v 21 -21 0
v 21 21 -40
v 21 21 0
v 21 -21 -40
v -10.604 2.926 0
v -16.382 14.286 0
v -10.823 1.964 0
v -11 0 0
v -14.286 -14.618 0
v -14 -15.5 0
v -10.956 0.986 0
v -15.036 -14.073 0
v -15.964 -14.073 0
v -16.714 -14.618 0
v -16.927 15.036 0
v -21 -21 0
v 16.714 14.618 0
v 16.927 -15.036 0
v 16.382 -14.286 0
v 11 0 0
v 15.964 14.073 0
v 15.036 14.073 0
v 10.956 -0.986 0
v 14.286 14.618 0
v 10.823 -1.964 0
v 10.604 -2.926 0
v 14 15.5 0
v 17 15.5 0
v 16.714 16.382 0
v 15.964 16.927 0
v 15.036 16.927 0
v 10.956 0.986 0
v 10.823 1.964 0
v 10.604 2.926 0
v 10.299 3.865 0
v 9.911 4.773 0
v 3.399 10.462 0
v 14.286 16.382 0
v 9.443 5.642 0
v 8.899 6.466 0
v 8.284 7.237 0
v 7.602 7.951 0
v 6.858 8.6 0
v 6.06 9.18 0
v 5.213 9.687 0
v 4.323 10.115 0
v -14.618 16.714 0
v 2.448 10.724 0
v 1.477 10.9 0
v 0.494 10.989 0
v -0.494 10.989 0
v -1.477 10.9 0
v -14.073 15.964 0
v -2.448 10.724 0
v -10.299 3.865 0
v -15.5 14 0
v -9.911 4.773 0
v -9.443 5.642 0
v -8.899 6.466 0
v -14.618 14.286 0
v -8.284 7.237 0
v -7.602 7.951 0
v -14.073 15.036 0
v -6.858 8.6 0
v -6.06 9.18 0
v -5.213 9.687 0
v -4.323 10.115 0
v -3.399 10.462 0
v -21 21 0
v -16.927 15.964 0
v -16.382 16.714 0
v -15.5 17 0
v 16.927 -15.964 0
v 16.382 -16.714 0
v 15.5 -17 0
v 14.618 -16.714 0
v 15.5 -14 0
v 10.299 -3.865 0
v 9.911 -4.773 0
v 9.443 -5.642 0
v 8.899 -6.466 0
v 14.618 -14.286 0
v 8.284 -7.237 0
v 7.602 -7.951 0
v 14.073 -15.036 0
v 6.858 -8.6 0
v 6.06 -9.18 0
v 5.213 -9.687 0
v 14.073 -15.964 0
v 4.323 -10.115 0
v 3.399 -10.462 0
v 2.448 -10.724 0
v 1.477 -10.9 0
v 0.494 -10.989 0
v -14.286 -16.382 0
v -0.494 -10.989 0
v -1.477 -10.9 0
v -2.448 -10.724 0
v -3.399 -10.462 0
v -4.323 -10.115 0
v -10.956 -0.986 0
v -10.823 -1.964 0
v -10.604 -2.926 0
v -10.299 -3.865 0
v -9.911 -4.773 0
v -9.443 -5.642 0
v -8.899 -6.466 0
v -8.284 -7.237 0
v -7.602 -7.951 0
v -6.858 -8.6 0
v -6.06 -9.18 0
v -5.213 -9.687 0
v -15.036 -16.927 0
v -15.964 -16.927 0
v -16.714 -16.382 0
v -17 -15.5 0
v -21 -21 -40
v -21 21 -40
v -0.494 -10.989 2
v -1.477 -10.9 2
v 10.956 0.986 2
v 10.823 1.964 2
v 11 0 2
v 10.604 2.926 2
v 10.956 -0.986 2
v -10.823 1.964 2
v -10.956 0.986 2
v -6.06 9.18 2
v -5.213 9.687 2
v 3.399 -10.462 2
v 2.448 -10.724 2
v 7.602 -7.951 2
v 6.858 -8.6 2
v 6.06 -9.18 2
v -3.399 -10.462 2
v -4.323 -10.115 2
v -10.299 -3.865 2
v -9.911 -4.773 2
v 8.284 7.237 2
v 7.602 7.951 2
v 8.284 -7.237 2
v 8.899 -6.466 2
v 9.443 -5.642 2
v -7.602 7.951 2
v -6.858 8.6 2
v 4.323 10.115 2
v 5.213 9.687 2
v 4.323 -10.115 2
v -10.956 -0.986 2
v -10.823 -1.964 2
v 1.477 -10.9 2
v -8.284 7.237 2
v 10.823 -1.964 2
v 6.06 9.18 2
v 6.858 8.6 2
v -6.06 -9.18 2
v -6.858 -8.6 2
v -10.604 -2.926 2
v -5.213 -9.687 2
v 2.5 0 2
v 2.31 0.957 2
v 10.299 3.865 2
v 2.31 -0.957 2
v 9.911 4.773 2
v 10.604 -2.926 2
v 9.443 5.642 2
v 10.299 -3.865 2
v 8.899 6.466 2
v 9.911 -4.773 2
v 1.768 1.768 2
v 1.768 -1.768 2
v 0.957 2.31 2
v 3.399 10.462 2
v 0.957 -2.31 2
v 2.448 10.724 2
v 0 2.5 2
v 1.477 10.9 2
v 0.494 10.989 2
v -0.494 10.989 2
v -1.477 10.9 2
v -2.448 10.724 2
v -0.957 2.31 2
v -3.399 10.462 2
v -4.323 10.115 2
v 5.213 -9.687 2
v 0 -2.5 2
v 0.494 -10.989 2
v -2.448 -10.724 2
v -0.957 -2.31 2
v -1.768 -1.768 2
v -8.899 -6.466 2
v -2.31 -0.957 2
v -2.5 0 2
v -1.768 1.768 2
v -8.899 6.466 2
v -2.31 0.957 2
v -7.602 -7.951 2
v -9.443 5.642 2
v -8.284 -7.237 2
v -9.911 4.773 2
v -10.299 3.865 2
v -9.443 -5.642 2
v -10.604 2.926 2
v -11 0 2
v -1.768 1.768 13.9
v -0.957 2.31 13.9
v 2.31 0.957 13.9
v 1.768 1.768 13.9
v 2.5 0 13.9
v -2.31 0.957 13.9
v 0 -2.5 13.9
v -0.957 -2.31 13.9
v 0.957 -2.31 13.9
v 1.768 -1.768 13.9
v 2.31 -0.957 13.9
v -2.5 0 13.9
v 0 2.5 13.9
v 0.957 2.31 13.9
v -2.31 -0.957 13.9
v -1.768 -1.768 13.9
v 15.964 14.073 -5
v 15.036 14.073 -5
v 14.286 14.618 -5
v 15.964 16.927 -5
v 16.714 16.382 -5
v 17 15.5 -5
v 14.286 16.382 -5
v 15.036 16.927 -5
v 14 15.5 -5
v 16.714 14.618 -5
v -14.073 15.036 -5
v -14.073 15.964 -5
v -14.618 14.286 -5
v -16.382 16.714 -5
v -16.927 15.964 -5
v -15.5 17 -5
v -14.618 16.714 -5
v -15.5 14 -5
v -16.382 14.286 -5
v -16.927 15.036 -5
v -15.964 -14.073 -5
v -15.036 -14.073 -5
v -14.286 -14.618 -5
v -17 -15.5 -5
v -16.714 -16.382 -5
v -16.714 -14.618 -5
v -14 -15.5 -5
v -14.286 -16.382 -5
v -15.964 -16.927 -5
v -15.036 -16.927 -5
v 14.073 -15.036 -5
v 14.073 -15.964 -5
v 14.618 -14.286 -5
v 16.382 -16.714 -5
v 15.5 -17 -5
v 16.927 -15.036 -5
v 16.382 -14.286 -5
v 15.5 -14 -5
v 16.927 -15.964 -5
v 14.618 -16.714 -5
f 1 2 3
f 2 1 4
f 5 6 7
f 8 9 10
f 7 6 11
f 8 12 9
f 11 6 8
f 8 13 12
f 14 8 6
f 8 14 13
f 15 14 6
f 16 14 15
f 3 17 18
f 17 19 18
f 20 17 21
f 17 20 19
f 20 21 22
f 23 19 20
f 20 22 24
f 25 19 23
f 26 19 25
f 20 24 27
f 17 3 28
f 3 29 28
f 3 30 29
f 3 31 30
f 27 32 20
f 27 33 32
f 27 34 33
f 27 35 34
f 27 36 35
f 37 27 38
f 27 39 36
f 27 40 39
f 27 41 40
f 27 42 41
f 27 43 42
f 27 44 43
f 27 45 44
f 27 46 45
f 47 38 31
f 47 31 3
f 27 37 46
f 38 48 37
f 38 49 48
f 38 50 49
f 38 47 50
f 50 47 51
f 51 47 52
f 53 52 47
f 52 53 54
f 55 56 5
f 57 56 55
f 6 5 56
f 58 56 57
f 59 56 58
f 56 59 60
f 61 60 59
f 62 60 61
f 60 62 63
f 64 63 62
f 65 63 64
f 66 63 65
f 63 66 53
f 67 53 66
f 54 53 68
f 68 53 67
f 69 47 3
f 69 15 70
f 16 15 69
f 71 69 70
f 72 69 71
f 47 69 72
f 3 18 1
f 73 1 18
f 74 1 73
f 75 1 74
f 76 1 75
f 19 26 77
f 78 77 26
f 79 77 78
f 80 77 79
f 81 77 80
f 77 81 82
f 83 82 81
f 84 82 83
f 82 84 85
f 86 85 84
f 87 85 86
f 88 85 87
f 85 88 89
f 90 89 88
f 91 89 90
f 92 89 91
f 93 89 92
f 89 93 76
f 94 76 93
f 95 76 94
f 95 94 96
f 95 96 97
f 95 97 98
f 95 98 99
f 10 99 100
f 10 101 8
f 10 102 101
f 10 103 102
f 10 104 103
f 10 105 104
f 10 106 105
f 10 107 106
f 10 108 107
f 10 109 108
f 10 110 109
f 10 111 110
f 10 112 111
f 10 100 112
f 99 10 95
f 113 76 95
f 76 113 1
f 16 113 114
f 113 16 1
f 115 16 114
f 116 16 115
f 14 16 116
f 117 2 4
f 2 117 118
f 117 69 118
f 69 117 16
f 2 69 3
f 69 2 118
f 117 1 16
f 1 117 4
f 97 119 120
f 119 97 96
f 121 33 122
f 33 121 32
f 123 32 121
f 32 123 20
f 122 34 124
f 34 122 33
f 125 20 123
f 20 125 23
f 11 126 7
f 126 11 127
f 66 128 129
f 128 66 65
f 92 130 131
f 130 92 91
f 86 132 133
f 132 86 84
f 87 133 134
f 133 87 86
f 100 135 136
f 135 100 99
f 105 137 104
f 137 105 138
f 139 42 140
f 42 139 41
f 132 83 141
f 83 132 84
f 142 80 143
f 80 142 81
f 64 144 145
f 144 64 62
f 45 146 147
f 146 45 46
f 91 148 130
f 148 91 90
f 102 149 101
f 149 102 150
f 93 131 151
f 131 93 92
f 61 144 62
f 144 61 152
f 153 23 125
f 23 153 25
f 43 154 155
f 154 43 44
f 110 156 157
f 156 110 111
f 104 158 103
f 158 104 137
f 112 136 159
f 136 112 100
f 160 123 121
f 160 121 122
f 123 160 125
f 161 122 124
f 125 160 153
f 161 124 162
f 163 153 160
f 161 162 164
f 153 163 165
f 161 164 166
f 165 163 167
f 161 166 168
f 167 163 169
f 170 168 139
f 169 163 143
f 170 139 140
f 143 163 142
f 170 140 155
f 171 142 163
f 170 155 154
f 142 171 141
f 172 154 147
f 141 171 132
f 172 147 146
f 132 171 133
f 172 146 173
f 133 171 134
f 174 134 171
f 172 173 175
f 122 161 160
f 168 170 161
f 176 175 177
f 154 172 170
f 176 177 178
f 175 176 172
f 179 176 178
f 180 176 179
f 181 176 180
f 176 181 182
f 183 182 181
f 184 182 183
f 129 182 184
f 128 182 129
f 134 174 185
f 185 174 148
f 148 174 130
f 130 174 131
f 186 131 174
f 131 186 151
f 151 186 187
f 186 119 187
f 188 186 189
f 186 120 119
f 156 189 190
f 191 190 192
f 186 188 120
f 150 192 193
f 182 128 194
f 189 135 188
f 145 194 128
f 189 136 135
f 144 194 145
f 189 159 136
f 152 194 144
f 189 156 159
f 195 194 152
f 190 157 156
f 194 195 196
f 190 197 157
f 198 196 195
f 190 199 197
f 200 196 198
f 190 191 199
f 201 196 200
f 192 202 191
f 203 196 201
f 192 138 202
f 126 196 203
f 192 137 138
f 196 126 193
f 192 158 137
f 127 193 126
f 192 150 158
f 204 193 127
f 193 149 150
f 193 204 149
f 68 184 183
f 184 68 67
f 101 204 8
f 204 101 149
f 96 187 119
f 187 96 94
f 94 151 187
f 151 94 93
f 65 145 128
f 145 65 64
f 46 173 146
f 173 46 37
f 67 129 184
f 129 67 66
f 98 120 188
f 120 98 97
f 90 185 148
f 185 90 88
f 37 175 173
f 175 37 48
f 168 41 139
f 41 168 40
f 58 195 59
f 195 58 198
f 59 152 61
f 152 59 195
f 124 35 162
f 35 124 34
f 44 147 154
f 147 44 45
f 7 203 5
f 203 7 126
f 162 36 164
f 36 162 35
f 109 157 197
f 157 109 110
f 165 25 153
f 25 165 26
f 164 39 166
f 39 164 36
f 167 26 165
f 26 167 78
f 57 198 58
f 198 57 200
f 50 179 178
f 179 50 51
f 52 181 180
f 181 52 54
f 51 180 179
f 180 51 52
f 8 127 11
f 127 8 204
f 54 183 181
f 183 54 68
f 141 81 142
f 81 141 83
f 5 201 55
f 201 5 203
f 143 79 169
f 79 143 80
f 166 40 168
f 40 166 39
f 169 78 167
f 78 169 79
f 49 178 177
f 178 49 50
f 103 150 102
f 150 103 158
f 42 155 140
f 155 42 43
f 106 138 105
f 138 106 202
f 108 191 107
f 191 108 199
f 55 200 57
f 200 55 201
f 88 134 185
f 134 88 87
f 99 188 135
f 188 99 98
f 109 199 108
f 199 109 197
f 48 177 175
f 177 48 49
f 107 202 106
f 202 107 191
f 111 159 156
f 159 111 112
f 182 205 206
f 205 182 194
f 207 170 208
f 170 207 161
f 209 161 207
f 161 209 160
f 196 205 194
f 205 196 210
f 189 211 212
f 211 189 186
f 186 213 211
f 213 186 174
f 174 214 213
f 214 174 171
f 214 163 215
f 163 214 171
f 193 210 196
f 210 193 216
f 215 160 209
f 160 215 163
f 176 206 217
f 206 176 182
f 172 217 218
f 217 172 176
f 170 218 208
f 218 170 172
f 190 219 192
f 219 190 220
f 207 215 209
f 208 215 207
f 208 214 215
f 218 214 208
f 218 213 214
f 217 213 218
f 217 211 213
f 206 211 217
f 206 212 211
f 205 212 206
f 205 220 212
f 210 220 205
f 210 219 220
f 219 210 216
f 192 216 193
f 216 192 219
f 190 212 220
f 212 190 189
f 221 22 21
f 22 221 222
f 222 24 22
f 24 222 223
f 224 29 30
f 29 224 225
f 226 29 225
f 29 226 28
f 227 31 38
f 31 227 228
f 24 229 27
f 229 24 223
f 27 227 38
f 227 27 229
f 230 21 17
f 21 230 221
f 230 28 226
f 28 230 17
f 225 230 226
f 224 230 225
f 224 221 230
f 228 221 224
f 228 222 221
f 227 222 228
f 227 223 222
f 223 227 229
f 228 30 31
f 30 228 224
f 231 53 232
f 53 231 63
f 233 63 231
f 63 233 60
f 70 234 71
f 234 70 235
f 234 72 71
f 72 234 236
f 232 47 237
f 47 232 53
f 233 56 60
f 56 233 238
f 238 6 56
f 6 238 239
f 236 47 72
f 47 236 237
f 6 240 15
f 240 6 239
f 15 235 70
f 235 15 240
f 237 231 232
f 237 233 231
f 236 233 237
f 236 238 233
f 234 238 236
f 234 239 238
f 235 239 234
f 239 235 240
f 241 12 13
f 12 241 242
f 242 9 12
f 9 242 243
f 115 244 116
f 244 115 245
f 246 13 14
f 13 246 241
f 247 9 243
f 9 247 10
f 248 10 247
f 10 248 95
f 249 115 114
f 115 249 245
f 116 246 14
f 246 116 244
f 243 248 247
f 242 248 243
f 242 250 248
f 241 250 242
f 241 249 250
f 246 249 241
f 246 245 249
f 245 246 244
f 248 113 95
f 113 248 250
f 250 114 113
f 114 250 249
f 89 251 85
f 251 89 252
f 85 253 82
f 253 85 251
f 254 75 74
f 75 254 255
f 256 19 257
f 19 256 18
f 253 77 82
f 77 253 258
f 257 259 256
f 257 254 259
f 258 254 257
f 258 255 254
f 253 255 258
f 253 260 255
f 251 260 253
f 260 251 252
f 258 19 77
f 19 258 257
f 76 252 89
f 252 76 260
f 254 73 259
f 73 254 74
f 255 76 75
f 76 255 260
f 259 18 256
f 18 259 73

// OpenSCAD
//
//  differential_planetary_gearbox
//
//  Copyright 2014 by Ron Aldrich.
//
//  License: CC-By-SA - http://creativecommons.org/licenses/by-sa/3.0/deed.en_US
//

$fa=1;
$fs=1;

x=0;
y=1;
z=2;

motor_size = 0;
motor_mount_spacing = 1;
motor_face_length = 2;
motor_face_radius = 3;

function motor_size(spec) = spec[motor_size];
function motor_mount_spacing(spec) = spec[motor_mount_spacing];
function motor_face_length(spec) = spec[motor_face_length];
function motor_face_radius(spec) = spec[motor_face_radius];

nema_14 = [[35.3, 35.3, 26], 26, 2, 11];
nema_17 = [[42, 42, 40], 31, 2, 11];

function nema_14() = nema_14;
function nema_17() = nema_17;

motor(nema_17);

module motor_bolts(spec)
{
	for(i=[0:3]) rotate(i*90) translate([spec[motor_mount_spacing]/2, spec[motor_mount_spacing]/2])
		child();
}

module motor(spec)
{
	render(convexity=4)
	{
		difference()
		{
			motor_solid(spec);
			motor_void(spec);
		}
	}
}

module motor_solid(spec)
{
	translate([0, 0, -spec[motor_size][z]/2])
	cube(spec[motor_size], center=true);

	translate([0, 0, -.1])
	cylinder(h=spec[motor_face_length]+.1, r=spec[motor_face_radius]);

	translate([0, 0, spec[motor_face_length]-.1])
	cylinder(h=12, r=5/2);
}

module motor_void(spec)
{
	translate([0, 0, -5])
		motor_bolts(spec)
		{
			cylinder(h=5.1, r=3/2);
		}
}
